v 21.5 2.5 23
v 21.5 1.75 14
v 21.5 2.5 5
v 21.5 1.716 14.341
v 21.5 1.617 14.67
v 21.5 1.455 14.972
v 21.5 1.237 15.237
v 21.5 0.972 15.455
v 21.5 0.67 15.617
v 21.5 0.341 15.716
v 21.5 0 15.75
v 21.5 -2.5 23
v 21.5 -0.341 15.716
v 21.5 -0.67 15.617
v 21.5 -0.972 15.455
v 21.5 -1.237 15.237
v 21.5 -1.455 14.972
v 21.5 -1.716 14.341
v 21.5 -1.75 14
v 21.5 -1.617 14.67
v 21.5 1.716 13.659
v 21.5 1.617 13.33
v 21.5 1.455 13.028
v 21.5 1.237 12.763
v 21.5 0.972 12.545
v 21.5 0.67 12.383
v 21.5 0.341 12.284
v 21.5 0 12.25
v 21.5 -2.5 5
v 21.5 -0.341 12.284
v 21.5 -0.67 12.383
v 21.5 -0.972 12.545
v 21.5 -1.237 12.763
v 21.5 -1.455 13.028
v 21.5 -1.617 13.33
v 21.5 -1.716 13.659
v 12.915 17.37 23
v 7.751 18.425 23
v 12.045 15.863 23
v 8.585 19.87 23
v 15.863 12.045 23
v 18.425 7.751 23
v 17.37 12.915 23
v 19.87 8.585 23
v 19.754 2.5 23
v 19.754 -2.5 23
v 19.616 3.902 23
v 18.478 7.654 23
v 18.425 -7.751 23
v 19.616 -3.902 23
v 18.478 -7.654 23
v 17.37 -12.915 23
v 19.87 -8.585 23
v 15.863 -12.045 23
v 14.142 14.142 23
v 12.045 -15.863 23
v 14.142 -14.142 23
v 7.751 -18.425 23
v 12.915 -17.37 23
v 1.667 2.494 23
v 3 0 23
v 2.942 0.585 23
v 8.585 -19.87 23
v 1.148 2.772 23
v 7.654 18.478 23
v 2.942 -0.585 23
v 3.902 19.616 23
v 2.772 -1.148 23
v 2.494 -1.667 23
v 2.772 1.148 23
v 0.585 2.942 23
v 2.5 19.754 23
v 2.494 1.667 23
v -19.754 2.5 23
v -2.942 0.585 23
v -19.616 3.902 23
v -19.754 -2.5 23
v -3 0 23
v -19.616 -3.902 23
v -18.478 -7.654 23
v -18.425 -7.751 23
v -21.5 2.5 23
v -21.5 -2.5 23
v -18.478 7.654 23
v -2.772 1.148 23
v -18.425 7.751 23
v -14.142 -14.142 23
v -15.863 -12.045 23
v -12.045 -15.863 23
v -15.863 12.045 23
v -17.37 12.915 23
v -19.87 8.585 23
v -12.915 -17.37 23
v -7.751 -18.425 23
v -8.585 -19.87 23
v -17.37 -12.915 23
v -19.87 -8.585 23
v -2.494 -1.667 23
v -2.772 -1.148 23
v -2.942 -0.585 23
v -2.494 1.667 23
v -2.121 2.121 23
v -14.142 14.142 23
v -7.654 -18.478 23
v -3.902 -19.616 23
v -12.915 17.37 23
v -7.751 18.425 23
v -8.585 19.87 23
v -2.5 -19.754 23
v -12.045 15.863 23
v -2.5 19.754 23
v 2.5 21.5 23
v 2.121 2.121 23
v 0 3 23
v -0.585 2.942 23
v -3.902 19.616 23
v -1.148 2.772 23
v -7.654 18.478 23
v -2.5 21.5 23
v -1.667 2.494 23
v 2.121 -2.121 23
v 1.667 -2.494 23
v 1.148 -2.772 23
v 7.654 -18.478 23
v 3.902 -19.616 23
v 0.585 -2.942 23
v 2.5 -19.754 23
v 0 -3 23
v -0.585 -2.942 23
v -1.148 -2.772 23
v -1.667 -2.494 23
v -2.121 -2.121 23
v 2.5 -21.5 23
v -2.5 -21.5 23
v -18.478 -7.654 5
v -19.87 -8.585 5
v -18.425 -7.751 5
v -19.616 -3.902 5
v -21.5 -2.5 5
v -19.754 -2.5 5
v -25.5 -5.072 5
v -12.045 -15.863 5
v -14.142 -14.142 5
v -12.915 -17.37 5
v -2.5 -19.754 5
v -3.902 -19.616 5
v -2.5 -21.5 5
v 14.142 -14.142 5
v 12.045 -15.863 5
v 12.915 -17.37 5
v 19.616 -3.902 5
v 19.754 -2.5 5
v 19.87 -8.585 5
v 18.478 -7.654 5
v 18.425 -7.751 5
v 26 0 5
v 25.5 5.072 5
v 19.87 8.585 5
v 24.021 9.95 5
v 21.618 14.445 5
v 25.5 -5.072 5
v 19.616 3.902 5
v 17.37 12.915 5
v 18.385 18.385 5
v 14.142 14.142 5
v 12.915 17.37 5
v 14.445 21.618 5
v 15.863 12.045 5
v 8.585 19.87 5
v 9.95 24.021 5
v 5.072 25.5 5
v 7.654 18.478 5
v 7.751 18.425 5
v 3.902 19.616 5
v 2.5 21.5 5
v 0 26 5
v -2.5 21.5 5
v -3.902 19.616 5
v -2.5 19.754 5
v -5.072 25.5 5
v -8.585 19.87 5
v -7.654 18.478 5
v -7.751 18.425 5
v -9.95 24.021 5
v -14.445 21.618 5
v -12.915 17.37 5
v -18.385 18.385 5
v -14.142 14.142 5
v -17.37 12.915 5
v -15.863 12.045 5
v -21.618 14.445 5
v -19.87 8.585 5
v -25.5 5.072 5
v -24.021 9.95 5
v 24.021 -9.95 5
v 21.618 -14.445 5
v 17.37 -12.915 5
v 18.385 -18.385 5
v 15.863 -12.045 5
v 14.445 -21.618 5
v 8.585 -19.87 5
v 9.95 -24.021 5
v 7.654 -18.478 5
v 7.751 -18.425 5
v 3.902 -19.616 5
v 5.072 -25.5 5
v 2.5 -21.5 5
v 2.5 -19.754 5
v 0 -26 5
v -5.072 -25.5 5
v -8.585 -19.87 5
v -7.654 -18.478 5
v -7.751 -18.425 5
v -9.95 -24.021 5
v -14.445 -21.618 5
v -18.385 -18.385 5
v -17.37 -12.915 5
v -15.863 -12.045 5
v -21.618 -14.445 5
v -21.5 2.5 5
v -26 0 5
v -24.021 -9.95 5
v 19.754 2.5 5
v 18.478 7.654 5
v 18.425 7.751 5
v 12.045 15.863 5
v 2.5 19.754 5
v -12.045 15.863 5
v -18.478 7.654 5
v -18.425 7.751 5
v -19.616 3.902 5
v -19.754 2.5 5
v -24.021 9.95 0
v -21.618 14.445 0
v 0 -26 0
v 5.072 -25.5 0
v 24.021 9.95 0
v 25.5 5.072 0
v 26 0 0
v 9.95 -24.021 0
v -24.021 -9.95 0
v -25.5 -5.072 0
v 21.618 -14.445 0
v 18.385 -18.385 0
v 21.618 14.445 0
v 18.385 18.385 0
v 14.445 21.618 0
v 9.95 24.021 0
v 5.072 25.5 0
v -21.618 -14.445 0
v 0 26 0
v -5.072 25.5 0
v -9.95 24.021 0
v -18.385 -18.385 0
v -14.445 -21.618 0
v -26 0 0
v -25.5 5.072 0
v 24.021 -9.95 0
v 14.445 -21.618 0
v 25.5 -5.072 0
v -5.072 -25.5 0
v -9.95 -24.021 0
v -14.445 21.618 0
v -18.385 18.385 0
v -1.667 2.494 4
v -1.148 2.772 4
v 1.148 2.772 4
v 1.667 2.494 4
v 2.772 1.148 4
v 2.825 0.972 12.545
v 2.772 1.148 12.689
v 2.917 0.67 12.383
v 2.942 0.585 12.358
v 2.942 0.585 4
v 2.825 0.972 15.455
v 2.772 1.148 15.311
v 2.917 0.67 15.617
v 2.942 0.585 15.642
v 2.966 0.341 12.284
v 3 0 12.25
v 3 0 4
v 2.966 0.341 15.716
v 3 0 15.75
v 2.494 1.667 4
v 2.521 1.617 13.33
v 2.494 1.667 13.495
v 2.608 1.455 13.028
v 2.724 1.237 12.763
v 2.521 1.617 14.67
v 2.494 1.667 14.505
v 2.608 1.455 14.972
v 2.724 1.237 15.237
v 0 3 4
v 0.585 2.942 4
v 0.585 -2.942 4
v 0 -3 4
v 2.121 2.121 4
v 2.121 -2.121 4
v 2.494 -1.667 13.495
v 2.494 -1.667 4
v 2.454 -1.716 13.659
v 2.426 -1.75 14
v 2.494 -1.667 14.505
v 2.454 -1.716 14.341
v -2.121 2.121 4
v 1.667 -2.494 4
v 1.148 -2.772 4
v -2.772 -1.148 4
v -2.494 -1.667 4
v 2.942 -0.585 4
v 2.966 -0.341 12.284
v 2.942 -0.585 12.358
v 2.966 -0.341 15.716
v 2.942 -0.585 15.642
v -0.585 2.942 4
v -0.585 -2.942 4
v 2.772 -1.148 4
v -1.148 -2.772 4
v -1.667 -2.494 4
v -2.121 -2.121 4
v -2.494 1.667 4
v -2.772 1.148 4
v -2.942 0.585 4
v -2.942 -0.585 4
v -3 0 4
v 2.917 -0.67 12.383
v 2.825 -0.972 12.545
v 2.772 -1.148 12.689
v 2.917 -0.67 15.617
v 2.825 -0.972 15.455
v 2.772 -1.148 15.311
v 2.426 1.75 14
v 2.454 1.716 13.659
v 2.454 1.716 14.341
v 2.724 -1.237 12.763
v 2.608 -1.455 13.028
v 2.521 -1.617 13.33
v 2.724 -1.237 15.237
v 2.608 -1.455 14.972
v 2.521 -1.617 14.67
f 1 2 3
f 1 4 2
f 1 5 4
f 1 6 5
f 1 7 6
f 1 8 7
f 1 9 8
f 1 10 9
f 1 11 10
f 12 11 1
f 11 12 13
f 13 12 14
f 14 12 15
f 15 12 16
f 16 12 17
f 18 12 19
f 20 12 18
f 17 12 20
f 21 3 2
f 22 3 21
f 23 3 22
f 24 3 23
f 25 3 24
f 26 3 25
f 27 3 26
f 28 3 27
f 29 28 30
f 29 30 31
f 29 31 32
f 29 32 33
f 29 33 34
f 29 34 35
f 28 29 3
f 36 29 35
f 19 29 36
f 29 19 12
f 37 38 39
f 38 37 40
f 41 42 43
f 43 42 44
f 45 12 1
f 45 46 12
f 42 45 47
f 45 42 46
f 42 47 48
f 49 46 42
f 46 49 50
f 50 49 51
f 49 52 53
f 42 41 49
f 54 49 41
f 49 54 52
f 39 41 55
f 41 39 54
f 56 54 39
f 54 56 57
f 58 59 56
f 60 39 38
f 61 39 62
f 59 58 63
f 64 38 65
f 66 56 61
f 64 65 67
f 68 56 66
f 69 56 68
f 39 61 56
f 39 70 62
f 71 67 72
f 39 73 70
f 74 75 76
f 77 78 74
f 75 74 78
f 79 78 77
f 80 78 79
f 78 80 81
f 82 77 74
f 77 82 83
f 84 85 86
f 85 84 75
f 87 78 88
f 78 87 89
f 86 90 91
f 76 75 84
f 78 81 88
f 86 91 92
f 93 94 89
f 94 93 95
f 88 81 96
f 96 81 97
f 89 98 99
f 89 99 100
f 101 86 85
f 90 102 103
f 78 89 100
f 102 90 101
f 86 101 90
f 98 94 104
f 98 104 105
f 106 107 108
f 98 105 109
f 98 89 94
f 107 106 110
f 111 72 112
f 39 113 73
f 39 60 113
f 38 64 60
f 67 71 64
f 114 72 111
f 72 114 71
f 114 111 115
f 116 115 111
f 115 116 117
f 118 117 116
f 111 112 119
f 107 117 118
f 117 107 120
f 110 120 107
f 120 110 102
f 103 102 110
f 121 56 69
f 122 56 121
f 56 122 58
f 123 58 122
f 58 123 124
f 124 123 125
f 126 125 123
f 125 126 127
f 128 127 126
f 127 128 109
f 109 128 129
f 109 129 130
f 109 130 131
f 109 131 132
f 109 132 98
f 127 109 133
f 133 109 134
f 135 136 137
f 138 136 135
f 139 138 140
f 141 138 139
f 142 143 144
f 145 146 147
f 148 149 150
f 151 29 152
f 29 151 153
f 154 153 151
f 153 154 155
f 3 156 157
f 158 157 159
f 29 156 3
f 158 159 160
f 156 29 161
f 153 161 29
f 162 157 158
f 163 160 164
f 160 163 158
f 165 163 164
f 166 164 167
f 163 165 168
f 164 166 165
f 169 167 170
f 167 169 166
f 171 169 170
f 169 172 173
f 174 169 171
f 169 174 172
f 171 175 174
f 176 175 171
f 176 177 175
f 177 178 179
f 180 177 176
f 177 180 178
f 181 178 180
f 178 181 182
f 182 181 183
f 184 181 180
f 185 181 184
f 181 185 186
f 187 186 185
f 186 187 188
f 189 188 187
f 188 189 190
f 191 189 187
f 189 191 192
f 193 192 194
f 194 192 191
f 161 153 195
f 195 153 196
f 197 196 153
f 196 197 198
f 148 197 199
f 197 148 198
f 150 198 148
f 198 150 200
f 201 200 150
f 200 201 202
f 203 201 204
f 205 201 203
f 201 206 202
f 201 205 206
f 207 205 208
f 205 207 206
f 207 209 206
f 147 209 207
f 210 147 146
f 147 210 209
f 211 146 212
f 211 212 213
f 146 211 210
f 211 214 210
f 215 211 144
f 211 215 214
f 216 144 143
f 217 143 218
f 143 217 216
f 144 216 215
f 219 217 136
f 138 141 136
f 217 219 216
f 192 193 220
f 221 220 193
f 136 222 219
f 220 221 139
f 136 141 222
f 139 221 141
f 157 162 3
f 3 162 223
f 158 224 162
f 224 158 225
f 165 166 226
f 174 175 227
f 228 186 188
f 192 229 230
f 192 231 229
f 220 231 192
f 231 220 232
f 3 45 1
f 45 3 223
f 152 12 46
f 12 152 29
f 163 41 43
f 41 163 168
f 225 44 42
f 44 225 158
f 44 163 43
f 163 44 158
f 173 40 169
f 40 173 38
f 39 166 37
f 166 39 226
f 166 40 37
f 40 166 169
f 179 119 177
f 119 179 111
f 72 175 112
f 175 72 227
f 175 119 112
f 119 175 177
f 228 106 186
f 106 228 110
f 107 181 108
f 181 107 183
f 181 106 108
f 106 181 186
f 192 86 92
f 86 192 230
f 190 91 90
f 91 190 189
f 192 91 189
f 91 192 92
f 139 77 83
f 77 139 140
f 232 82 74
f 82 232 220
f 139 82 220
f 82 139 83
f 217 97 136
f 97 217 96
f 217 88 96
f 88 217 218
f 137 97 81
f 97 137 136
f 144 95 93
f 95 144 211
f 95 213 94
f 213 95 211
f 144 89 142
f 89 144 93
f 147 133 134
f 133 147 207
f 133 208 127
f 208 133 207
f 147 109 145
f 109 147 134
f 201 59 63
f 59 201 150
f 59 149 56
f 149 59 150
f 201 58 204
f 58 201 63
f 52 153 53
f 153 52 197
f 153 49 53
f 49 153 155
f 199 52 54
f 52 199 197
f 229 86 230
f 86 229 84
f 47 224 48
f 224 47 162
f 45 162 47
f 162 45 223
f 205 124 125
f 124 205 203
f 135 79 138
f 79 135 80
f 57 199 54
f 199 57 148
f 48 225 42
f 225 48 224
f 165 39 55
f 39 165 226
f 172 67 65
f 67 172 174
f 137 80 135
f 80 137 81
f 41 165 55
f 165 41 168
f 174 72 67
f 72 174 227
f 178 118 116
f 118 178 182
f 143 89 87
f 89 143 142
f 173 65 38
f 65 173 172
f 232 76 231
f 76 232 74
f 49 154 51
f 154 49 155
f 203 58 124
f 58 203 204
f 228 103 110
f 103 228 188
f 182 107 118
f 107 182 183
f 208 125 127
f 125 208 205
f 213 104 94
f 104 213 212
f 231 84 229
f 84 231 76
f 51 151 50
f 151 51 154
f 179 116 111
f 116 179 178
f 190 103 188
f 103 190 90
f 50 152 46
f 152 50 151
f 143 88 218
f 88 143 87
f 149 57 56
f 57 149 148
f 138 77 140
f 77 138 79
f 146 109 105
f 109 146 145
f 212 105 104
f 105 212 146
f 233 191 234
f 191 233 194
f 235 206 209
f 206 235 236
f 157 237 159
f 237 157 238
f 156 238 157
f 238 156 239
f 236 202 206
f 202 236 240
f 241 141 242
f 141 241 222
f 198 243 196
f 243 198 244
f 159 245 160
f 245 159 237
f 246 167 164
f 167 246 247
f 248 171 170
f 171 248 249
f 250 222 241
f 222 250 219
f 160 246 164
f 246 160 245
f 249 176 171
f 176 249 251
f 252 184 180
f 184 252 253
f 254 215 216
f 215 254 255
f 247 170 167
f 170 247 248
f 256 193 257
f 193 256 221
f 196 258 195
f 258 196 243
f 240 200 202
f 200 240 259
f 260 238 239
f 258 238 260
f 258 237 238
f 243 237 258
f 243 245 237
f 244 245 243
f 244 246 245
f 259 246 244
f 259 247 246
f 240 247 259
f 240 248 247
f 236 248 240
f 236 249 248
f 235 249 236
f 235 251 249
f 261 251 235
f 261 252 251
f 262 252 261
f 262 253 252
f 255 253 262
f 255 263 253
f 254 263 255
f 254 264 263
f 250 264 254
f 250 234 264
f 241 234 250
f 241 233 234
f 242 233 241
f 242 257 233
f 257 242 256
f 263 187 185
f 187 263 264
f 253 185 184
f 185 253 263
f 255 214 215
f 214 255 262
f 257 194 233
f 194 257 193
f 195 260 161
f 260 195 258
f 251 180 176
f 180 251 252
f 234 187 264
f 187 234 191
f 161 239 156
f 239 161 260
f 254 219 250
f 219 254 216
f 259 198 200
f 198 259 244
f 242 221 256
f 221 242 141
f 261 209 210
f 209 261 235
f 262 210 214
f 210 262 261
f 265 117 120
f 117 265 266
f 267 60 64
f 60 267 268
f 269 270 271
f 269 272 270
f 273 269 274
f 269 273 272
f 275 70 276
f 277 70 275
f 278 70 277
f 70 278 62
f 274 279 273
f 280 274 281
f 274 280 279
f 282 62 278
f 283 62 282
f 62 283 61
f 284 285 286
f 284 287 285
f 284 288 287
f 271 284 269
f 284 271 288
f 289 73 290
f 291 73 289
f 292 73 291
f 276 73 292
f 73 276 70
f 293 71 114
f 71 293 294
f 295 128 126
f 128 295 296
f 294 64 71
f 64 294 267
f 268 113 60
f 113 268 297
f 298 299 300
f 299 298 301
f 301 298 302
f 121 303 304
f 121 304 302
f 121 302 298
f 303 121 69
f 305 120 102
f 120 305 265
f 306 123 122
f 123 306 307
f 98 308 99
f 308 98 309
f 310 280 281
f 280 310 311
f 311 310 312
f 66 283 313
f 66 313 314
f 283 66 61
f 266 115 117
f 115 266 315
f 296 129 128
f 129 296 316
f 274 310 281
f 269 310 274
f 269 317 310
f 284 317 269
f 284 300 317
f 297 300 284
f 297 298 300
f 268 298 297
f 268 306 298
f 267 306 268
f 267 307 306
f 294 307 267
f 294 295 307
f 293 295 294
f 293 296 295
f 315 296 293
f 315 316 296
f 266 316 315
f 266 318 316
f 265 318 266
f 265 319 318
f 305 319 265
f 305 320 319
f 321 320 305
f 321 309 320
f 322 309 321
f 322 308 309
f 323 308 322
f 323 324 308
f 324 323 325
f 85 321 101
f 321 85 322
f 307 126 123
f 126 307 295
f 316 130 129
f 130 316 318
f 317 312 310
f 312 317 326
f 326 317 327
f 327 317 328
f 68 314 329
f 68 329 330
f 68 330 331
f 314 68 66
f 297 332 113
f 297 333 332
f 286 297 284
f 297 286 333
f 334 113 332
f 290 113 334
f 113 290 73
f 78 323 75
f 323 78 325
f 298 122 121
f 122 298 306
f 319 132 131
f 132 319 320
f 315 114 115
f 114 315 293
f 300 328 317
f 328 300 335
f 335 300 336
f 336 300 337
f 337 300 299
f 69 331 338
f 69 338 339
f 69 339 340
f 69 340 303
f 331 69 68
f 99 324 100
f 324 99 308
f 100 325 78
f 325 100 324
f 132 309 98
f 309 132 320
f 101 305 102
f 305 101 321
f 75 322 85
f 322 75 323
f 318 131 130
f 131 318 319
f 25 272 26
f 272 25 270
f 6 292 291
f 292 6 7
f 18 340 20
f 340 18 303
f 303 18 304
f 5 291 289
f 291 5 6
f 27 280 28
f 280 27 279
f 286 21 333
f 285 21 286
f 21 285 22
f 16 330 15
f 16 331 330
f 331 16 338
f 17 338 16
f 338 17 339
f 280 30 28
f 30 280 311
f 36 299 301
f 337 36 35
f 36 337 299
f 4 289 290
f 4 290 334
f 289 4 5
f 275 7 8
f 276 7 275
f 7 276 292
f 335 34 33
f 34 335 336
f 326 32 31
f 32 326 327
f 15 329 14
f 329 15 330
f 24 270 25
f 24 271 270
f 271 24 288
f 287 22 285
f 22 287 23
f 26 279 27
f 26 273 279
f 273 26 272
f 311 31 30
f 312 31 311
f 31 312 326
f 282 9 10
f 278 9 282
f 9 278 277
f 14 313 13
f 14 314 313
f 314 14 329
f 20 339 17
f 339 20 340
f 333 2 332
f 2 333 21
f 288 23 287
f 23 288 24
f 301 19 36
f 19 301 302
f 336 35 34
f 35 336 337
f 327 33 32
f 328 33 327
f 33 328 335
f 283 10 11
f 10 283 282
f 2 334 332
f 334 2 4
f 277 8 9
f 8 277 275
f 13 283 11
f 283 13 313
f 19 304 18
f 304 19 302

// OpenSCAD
$fn = 32;

// ----------------------------------------------------------------------
// Control knob: skirt knob with grip ribs
// ----------------------------------------------------------------------

// --- parameters (mm) ---
skirt_d = 52;             // skirt diameter
skirt_t = 5;              // skirt thickness
rib_w = 5;                // grip rib width
rib_out = 2.5;            // grip rib radial protrusion
n_ribs = 12;              // number of grip ribs
knob_d = 40;              // knob body diameter
knob_h = 18;              // knob body height
bore_d = 6;               // shaft bore diameter
set_d = 3.5;              // set screw bore diameter
fit_tol = 0.1;            // tolerance for press fits, mm
free_tol = 0.5;           // tolerance for clearance fits, mm

rib_step = 360 / n_ribs;  // rib angular step
total_h = skirt_t + knob_h;  // overall height

difference() {
  union() {
    translate([0, 0, skirt_t]) cylinder(h = knob_h, d = knob_d);
    cylinder(h = skirt_t, d = skirt_d);
    for (i = [0 : n_ribs - 1])
      rotate([0, 0, i * rib_step])
        translate([knob_d / 2 - 1, -rib_w / 2, skirt_t])
          cube([rib_out, rib_w, knob_h]);
  }
  translate([0, 0, skirt_t - 1]) cylinder(h = knob_h + 2, d = bore_d);
  translate([-1, 0, skirt_t + knob_h / 2]) rotate([0, 90, 0])
    cylinder(h = knob_d / 2 + bore_d / 2 + 2, d = set_d);
}
